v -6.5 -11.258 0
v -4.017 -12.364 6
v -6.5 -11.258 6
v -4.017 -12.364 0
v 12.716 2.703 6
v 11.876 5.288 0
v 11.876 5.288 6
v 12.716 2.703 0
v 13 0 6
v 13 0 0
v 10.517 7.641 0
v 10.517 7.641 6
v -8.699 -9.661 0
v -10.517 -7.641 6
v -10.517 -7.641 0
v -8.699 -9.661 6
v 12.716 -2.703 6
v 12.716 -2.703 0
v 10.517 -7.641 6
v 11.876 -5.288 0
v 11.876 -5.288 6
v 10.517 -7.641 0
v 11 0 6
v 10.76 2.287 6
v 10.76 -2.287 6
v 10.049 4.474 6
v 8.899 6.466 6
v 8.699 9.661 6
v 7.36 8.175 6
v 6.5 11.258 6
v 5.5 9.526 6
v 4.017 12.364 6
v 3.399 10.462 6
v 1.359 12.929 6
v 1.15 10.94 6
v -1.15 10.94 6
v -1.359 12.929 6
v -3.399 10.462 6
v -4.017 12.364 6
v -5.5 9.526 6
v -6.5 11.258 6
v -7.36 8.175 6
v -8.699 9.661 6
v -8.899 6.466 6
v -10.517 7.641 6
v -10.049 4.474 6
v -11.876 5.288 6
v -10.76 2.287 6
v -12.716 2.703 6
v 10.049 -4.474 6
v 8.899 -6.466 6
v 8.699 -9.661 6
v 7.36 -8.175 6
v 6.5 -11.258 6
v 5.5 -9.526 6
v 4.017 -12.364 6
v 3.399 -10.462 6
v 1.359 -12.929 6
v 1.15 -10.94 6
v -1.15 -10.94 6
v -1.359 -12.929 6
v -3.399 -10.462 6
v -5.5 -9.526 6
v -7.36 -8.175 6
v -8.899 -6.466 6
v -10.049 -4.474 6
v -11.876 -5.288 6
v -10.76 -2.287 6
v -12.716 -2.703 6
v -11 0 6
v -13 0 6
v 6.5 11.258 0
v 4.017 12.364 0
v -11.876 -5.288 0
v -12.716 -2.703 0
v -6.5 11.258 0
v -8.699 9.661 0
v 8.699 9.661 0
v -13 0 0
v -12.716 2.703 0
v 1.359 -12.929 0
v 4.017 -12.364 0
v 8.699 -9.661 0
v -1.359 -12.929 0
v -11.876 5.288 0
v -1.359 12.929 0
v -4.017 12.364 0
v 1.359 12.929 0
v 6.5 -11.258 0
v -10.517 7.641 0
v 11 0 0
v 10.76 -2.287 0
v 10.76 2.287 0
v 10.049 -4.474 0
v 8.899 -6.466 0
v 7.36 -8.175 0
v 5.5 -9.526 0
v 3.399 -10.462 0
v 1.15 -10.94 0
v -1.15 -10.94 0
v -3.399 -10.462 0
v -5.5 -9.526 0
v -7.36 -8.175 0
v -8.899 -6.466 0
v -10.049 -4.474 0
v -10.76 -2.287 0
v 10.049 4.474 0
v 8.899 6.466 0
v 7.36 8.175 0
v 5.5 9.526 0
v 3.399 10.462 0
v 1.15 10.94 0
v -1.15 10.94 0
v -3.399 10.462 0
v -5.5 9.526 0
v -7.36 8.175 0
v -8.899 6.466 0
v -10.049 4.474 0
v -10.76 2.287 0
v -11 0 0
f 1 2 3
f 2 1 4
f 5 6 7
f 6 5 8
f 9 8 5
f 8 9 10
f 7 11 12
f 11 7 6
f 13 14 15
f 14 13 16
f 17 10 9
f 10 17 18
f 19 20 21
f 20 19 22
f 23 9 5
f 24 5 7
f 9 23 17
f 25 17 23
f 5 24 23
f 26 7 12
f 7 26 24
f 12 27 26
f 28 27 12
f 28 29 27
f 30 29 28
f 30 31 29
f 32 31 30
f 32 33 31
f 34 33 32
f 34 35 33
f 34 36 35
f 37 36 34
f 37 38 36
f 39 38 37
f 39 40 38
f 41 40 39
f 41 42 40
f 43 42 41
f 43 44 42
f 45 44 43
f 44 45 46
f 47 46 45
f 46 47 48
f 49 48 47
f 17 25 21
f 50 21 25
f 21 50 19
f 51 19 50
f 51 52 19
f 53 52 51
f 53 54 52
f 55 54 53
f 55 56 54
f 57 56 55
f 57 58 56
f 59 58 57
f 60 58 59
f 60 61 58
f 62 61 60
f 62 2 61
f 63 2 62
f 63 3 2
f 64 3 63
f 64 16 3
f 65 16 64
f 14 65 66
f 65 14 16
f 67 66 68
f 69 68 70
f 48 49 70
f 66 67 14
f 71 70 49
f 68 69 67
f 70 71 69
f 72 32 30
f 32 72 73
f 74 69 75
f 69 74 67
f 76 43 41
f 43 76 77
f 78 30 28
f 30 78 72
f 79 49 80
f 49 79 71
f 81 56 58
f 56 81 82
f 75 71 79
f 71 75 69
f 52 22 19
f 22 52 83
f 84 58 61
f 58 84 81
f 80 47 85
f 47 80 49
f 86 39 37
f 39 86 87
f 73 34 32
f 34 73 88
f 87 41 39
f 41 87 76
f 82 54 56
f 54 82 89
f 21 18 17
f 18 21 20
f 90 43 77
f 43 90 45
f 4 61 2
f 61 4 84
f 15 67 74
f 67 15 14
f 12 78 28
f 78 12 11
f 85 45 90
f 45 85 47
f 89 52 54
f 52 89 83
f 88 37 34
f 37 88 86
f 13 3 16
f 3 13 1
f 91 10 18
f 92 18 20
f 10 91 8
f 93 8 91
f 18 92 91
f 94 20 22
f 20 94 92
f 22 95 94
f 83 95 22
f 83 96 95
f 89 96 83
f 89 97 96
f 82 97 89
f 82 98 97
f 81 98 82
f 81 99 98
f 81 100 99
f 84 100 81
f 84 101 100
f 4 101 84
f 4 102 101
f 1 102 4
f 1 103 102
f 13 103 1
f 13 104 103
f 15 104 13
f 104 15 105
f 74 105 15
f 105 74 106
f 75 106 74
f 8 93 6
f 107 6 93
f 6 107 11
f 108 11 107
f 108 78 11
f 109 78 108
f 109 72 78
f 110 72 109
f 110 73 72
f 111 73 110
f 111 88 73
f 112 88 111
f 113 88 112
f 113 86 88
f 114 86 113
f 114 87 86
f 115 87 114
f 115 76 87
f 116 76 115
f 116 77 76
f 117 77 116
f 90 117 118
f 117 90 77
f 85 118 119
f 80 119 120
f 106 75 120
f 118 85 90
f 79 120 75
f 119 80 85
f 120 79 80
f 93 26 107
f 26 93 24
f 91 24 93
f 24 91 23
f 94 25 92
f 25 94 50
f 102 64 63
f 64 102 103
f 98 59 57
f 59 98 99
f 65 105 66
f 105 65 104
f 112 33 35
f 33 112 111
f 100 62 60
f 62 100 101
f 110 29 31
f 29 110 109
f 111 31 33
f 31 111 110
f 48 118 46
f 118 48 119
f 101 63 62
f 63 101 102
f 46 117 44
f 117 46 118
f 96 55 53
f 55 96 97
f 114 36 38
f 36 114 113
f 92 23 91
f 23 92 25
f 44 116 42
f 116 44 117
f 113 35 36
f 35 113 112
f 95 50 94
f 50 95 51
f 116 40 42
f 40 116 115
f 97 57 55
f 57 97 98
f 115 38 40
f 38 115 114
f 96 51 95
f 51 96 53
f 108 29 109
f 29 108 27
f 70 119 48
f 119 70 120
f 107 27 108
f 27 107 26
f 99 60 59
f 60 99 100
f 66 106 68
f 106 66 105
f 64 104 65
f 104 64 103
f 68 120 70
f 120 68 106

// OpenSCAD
module createRope(){
	linear_extrude(
						height = 5, 
						center = true, 
						twist = 360*3, 
						slices = 200
	){
		translate([12, 0, 0]){
			circle(r = 1.8);
		}
	}
}

translate([0, 0, 3]){
	difference(){
		cylinder(r=13,h=6, center=true);
		cylinder(r=11,h=15, center=true);
	}
}
//createRope();
